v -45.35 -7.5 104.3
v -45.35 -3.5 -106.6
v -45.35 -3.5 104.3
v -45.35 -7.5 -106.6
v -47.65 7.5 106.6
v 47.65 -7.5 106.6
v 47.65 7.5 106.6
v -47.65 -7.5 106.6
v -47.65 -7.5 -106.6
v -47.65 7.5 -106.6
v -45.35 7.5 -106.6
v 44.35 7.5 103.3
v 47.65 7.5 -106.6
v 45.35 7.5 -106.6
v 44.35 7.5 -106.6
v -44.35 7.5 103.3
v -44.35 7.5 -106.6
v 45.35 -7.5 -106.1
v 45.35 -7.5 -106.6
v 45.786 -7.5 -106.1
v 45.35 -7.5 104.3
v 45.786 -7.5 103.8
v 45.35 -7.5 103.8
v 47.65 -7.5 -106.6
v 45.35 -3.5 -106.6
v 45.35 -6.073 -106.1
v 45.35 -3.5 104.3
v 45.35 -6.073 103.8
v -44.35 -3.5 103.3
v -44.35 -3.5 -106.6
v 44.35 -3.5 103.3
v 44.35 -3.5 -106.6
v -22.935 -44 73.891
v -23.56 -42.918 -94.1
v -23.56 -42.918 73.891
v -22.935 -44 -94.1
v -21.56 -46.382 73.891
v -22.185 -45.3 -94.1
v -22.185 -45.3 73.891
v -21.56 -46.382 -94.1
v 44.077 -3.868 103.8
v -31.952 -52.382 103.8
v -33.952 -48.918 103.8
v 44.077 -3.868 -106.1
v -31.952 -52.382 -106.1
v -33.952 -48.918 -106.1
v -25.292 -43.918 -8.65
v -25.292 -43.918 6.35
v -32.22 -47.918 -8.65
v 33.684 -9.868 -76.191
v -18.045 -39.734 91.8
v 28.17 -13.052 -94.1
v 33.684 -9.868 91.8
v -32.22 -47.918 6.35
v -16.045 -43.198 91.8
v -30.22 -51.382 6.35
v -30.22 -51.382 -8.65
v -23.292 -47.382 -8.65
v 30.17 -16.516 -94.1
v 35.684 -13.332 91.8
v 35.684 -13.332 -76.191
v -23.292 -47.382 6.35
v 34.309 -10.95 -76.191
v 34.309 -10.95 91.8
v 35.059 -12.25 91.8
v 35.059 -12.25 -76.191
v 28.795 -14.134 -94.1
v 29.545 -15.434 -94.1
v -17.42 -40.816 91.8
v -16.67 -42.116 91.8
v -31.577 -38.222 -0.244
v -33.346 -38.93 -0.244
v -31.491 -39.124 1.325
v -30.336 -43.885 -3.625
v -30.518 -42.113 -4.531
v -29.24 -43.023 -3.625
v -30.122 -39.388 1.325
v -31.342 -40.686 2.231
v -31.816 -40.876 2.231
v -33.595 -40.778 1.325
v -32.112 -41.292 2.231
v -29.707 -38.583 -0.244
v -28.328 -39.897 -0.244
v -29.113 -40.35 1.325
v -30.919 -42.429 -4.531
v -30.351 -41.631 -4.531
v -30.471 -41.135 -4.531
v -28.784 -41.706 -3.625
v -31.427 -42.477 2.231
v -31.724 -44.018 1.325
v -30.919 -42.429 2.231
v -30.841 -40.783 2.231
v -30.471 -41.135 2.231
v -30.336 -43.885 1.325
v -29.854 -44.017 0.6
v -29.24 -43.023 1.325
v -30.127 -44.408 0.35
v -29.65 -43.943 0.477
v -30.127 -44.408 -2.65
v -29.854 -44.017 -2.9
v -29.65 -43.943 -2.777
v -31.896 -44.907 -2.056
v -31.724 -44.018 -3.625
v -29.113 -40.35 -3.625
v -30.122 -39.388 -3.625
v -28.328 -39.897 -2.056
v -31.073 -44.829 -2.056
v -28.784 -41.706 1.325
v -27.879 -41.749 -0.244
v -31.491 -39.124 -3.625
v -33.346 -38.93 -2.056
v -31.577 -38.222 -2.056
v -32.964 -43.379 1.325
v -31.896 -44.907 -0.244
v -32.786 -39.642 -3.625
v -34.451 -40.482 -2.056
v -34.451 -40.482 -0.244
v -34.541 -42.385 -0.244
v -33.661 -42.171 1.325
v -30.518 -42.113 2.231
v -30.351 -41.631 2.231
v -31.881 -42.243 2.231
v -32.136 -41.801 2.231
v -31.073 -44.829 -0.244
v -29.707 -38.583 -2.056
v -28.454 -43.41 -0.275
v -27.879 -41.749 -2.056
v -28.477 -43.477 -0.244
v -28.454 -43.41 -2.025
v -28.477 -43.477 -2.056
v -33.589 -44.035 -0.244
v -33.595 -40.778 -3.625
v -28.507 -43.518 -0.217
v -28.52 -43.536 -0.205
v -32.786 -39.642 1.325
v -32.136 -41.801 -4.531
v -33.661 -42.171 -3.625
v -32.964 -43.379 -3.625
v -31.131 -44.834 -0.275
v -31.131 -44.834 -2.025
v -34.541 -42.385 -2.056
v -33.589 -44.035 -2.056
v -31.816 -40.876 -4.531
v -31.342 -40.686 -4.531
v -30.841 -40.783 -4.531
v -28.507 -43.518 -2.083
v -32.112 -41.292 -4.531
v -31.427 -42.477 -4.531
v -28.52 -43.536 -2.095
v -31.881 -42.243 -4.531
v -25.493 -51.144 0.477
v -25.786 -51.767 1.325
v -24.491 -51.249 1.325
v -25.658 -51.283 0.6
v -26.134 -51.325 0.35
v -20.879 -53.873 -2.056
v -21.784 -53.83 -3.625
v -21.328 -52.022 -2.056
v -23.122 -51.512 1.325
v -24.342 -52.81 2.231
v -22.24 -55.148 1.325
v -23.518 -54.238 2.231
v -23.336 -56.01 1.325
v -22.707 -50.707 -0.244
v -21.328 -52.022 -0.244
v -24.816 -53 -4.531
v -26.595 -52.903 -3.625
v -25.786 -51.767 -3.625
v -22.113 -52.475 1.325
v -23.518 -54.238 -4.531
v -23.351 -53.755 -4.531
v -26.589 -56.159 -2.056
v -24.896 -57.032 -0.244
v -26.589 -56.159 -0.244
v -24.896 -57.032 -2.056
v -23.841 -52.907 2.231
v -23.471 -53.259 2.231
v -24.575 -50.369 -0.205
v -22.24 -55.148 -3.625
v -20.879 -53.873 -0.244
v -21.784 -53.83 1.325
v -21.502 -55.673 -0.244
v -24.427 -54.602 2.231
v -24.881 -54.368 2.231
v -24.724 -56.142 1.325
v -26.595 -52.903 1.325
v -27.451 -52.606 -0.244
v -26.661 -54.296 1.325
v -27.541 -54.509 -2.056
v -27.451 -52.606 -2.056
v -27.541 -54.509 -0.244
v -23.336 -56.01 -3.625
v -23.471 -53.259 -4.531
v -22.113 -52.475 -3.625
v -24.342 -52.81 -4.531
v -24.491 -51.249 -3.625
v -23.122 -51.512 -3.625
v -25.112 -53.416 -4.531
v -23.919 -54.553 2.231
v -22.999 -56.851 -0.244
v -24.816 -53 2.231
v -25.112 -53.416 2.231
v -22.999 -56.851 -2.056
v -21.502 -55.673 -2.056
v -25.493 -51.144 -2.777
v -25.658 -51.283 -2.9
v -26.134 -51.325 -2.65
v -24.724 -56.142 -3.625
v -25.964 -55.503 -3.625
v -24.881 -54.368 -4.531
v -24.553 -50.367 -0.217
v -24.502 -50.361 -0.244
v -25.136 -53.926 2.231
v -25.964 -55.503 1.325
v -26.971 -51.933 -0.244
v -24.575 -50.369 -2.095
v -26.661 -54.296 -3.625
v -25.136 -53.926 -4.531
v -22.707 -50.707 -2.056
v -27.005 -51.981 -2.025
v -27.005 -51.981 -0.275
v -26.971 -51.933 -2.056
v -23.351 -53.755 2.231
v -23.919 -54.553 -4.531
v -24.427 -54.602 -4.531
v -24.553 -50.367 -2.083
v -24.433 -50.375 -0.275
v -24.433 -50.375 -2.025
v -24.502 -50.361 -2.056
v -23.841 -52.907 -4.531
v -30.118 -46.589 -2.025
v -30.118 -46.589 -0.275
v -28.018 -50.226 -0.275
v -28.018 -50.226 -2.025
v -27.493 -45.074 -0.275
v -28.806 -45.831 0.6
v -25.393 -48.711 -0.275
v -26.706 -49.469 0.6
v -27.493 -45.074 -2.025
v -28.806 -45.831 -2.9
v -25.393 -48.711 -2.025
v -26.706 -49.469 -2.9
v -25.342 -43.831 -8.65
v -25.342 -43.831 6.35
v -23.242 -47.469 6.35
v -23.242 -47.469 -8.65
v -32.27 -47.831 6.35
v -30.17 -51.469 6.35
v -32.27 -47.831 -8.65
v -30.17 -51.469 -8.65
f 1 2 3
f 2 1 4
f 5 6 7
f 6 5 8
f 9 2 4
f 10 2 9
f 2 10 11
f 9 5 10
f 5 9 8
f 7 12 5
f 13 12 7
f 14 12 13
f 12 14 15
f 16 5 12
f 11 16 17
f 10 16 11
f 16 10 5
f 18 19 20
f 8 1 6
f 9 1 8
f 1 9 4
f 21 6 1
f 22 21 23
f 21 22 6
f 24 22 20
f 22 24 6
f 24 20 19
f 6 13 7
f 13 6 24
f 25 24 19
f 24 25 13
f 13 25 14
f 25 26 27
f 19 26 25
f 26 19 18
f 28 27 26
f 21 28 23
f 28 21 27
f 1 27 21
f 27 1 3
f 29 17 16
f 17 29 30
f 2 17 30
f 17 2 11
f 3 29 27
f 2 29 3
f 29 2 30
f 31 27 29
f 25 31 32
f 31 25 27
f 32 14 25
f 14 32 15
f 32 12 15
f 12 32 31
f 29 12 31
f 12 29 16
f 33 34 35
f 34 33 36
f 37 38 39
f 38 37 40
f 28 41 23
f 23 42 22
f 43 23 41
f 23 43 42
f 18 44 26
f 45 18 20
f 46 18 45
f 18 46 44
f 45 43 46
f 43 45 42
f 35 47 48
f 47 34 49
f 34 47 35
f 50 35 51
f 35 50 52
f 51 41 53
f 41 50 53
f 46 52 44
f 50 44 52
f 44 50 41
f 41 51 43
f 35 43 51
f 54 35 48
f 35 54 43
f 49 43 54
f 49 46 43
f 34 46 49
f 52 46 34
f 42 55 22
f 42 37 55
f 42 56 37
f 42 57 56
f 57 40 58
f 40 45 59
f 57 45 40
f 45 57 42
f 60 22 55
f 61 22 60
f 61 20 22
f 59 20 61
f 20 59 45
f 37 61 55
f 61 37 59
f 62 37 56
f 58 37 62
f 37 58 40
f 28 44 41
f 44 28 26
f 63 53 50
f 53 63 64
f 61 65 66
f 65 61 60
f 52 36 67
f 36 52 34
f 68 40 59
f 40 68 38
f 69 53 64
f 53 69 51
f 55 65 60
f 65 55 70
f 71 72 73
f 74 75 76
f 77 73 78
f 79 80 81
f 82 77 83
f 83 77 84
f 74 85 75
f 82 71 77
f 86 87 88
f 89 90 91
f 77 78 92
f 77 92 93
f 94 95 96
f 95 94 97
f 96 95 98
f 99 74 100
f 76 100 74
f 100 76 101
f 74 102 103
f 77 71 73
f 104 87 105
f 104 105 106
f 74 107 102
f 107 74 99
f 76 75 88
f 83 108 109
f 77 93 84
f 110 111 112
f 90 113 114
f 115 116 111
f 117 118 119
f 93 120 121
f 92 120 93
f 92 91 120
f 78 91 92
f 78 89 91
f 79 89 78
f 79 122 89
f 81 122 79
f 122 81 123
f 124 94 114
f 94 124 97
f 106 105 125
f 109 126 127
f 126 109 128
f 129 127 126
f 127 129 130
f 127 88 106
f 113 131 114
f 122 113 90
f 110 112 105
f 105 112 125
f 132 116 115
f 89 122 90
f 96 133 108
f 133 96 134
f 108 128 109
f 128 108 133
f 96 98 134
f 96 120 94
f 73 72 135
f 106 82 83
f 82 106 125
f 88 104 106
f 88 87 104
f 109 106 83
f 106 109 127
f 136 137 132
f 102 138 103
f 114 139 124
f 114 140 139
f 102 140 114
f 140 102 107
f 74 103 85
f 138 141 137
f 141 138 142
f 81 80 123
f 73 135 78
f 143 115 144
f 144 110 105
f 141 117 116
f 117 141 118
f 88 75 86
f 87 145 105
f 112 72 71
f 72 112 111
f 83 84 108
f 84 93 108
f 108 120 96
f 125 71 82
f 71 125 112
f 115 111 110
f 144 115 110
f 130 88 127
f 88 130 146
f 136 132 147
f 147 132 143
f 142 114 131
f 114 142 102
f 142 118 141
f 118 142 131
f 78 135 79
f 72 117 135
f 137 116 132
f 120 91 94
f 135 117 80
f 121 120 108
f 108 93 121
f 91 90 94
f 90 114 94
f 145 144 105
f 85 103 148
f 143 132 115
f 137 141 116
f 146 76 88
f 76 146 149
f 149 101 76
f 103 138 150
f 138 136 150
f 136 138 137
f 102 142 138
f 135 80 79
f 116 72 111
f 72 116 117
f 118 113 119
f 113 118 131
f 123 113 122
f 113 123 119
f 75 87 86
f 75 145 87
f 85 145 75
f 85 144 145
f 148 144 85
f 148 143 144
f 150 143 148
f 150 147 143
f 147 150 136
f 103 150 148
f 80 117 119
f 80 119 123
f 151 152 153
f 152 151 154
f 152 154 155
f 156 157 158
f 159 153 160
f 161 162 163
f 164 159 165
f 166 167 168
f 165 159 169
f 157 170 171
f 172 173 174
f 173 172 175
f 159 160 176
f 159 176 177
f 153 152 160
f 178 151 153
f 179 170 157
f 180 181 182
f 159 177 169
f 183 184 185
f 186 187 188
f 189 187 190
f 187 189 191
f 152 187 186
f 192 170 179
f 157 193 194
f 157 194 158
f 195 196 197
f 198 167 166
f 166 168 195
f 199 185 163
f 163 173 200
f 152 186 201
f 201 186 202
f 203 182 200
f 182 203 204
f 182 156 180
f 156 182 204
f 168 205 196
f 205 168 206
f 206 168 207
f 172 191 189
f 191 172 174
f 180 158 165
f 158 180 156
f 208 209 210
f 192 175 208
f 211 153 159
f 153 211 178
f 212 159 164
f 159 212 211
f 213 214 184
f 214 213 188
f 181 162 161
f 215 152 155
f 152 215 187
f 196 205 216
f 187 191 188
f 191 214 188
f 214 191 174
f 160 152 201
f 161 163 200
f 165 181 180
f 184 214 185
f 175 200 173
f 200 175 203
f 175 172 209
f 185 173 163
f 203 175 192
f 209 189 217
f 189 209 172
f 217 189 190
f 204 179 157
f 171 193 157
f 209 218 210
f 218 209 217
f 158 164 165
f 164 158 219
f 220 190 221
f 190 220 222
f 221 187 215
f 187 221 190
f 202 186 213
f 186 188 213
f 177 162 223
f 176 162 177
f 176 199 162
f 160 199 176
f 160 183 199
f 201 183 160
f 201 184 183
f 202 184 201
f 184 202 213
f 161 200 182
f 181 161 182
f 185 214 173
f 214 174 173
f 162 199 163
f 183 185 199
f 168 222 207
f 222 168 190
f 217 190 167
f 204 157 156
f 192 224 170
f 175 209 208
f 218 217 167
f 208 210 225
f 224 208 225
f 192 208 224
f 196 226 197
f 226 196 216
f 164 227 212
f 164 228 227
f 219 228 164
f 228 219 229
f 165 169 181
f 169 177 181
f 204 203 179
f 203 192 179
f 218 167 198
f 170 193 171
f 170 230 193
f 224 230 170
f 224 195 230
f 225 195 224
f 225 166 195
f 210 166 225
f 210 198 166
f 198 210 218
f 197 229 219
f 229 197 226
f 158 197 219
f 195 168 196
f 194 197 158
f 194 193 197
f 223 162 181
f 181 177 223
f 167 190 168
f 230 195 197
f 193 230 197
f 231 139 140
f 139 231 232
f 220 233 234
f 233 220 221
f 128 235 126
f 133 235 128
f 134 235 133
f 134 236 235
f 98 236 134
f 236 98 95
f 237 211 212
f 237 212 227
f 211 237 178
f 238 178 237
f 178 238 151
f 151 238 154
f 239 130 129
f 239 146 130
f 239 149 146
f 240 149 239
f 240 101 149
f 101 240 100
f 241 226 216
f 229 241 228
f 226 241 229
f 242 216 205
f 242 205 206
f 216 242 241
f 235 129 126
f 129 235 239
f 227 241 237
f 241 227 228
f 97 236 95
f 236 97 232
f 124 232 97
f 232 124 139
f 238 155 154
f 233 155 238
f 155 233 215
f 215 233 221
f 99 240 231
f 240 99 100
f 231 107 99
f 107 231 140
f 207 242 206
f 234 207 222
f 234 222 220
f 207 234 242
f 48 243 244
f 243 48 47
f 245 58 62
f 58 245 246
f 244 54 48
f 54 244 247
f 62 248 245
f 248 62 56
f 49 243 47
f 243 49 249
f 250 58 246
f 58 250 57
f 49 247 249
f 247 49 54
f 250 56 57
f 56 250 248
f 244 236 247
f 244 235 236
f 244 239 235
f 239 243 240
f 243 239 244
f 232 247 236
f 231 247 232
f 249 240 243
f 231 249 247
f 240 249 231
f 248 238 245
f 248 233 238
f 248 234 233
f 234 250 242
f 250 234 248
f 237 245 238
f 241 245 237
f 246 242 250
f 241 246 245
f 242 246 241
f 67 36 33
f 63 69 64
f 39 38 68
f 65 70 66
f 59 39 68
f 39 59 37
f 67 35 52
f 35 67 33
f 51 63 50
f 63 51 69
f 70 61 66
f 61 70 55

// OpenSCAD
module basicdoor(width=95.3, height=213.2, wall_thickness=15, right_handed = false, open_angle = 30) 
{
    profile_width = 12;
    door_thickness = 4.0;
    frame_profile_width = 2.3;
    frame_profile_depth = wall_thickness;
    seal_profile_width = 1.0;
    
    /* Outer frame fixed to convrete wall. */
    color([0.3,0.0,0.1])
    basicdoorframe(false, width, height, frame_profile_width, frame_profile_depth);

    color([0.4,0.2,0.2])
    translate([0, door_thickness/2,-frame_profile_width/2])
    basicdoorframe(false, width - 2 * frame_profile_width,
        height - frame_profile_width, 
        seal_profile_width, frame_profile_depth - door_thickness);
    
    /* Calculate door size. */
    open_w = width - 2 * frame_profile_width - 0.6;
    open_h = height - frame_profile_width - 1.0;

    ow = open_w/2 + 0.2;
    translate([right_handed?-ow:ow, 
        -(frame_profile_depth-door_thickness)/2, -frame_profile_width/2])
    rotate([0, 0, right_handed?-open_angle:open_angle])
    translate([right_handed?ow:-ow, 0, 0])
     union() {
        /* Playwood */
        color([0.4,0.0,0.1])
        cube([open_w, 1.5, open_h], center=true);
        
        /* Door strengtehing. */
        color([0.5,0.2,0.2])
        basicdoorframe(true, open_w, open_h, profile_width, door_thickness);
        
         /* Diagonal strengthening */
        dx = open_w - 2*profile_width;
        dy = open_h - 2*profile_width;
        l = sqrt(dx*dx+dy*dy);
        rotate([0,-atan2(dx,dy), 0])
        color([0.5,0.2,0.2])
        cube([profile_width, door_thickness, l], center=true);
         
         /* Door knob */
         translate([right_handed ? open_w/2 - 6.0 : -open_w/2 + 6.0, 0, 0])
         color([218/255,172/255,96/255])
         doorknob(door_thickness);
    }
}

module basicdoorframe(draw_bottom=true,width=70, height=110, profile_width = 5, door_thickness = 8) 
{
    translate([-(width - profile_width)/2, 0, 0]) 
    cube([profile_width,door_thickness, height], center=true);
    
    translate([(width - profile_width)/2, 0, 0]) 
    cube([profile_width,door_thickness, height], center=true);

    if (draw_bottom) {
        translate([0, 0, -(height - profile_width)/2]) 
        cube([width, door_thickness, profile_width], center=true);
    }
    
    translate([0, 0, (height - profile_width)/2]) 
    cube([width, door_thickness, profile_width], center=true);
}    

module doorknob(door_thickness = 8)
{
    doorknob_length = 7;
    doorknob_r = 3.5;
    
    translate([0, doorknob_length, 0]) 
    sphere(r=doorknob_r);
    translate([0, -doorknob_length, 0]) 
    sphere(r=doorknob_r);
 
    rotate([90, 90, 0])
    cylinder(h = doorknob_length*2, r = 0.5 * doorknob_r, center=true);
   
    cube([8, door_thickness+0.2, 15],center=true); 
}

// For testing
basicdoor();
